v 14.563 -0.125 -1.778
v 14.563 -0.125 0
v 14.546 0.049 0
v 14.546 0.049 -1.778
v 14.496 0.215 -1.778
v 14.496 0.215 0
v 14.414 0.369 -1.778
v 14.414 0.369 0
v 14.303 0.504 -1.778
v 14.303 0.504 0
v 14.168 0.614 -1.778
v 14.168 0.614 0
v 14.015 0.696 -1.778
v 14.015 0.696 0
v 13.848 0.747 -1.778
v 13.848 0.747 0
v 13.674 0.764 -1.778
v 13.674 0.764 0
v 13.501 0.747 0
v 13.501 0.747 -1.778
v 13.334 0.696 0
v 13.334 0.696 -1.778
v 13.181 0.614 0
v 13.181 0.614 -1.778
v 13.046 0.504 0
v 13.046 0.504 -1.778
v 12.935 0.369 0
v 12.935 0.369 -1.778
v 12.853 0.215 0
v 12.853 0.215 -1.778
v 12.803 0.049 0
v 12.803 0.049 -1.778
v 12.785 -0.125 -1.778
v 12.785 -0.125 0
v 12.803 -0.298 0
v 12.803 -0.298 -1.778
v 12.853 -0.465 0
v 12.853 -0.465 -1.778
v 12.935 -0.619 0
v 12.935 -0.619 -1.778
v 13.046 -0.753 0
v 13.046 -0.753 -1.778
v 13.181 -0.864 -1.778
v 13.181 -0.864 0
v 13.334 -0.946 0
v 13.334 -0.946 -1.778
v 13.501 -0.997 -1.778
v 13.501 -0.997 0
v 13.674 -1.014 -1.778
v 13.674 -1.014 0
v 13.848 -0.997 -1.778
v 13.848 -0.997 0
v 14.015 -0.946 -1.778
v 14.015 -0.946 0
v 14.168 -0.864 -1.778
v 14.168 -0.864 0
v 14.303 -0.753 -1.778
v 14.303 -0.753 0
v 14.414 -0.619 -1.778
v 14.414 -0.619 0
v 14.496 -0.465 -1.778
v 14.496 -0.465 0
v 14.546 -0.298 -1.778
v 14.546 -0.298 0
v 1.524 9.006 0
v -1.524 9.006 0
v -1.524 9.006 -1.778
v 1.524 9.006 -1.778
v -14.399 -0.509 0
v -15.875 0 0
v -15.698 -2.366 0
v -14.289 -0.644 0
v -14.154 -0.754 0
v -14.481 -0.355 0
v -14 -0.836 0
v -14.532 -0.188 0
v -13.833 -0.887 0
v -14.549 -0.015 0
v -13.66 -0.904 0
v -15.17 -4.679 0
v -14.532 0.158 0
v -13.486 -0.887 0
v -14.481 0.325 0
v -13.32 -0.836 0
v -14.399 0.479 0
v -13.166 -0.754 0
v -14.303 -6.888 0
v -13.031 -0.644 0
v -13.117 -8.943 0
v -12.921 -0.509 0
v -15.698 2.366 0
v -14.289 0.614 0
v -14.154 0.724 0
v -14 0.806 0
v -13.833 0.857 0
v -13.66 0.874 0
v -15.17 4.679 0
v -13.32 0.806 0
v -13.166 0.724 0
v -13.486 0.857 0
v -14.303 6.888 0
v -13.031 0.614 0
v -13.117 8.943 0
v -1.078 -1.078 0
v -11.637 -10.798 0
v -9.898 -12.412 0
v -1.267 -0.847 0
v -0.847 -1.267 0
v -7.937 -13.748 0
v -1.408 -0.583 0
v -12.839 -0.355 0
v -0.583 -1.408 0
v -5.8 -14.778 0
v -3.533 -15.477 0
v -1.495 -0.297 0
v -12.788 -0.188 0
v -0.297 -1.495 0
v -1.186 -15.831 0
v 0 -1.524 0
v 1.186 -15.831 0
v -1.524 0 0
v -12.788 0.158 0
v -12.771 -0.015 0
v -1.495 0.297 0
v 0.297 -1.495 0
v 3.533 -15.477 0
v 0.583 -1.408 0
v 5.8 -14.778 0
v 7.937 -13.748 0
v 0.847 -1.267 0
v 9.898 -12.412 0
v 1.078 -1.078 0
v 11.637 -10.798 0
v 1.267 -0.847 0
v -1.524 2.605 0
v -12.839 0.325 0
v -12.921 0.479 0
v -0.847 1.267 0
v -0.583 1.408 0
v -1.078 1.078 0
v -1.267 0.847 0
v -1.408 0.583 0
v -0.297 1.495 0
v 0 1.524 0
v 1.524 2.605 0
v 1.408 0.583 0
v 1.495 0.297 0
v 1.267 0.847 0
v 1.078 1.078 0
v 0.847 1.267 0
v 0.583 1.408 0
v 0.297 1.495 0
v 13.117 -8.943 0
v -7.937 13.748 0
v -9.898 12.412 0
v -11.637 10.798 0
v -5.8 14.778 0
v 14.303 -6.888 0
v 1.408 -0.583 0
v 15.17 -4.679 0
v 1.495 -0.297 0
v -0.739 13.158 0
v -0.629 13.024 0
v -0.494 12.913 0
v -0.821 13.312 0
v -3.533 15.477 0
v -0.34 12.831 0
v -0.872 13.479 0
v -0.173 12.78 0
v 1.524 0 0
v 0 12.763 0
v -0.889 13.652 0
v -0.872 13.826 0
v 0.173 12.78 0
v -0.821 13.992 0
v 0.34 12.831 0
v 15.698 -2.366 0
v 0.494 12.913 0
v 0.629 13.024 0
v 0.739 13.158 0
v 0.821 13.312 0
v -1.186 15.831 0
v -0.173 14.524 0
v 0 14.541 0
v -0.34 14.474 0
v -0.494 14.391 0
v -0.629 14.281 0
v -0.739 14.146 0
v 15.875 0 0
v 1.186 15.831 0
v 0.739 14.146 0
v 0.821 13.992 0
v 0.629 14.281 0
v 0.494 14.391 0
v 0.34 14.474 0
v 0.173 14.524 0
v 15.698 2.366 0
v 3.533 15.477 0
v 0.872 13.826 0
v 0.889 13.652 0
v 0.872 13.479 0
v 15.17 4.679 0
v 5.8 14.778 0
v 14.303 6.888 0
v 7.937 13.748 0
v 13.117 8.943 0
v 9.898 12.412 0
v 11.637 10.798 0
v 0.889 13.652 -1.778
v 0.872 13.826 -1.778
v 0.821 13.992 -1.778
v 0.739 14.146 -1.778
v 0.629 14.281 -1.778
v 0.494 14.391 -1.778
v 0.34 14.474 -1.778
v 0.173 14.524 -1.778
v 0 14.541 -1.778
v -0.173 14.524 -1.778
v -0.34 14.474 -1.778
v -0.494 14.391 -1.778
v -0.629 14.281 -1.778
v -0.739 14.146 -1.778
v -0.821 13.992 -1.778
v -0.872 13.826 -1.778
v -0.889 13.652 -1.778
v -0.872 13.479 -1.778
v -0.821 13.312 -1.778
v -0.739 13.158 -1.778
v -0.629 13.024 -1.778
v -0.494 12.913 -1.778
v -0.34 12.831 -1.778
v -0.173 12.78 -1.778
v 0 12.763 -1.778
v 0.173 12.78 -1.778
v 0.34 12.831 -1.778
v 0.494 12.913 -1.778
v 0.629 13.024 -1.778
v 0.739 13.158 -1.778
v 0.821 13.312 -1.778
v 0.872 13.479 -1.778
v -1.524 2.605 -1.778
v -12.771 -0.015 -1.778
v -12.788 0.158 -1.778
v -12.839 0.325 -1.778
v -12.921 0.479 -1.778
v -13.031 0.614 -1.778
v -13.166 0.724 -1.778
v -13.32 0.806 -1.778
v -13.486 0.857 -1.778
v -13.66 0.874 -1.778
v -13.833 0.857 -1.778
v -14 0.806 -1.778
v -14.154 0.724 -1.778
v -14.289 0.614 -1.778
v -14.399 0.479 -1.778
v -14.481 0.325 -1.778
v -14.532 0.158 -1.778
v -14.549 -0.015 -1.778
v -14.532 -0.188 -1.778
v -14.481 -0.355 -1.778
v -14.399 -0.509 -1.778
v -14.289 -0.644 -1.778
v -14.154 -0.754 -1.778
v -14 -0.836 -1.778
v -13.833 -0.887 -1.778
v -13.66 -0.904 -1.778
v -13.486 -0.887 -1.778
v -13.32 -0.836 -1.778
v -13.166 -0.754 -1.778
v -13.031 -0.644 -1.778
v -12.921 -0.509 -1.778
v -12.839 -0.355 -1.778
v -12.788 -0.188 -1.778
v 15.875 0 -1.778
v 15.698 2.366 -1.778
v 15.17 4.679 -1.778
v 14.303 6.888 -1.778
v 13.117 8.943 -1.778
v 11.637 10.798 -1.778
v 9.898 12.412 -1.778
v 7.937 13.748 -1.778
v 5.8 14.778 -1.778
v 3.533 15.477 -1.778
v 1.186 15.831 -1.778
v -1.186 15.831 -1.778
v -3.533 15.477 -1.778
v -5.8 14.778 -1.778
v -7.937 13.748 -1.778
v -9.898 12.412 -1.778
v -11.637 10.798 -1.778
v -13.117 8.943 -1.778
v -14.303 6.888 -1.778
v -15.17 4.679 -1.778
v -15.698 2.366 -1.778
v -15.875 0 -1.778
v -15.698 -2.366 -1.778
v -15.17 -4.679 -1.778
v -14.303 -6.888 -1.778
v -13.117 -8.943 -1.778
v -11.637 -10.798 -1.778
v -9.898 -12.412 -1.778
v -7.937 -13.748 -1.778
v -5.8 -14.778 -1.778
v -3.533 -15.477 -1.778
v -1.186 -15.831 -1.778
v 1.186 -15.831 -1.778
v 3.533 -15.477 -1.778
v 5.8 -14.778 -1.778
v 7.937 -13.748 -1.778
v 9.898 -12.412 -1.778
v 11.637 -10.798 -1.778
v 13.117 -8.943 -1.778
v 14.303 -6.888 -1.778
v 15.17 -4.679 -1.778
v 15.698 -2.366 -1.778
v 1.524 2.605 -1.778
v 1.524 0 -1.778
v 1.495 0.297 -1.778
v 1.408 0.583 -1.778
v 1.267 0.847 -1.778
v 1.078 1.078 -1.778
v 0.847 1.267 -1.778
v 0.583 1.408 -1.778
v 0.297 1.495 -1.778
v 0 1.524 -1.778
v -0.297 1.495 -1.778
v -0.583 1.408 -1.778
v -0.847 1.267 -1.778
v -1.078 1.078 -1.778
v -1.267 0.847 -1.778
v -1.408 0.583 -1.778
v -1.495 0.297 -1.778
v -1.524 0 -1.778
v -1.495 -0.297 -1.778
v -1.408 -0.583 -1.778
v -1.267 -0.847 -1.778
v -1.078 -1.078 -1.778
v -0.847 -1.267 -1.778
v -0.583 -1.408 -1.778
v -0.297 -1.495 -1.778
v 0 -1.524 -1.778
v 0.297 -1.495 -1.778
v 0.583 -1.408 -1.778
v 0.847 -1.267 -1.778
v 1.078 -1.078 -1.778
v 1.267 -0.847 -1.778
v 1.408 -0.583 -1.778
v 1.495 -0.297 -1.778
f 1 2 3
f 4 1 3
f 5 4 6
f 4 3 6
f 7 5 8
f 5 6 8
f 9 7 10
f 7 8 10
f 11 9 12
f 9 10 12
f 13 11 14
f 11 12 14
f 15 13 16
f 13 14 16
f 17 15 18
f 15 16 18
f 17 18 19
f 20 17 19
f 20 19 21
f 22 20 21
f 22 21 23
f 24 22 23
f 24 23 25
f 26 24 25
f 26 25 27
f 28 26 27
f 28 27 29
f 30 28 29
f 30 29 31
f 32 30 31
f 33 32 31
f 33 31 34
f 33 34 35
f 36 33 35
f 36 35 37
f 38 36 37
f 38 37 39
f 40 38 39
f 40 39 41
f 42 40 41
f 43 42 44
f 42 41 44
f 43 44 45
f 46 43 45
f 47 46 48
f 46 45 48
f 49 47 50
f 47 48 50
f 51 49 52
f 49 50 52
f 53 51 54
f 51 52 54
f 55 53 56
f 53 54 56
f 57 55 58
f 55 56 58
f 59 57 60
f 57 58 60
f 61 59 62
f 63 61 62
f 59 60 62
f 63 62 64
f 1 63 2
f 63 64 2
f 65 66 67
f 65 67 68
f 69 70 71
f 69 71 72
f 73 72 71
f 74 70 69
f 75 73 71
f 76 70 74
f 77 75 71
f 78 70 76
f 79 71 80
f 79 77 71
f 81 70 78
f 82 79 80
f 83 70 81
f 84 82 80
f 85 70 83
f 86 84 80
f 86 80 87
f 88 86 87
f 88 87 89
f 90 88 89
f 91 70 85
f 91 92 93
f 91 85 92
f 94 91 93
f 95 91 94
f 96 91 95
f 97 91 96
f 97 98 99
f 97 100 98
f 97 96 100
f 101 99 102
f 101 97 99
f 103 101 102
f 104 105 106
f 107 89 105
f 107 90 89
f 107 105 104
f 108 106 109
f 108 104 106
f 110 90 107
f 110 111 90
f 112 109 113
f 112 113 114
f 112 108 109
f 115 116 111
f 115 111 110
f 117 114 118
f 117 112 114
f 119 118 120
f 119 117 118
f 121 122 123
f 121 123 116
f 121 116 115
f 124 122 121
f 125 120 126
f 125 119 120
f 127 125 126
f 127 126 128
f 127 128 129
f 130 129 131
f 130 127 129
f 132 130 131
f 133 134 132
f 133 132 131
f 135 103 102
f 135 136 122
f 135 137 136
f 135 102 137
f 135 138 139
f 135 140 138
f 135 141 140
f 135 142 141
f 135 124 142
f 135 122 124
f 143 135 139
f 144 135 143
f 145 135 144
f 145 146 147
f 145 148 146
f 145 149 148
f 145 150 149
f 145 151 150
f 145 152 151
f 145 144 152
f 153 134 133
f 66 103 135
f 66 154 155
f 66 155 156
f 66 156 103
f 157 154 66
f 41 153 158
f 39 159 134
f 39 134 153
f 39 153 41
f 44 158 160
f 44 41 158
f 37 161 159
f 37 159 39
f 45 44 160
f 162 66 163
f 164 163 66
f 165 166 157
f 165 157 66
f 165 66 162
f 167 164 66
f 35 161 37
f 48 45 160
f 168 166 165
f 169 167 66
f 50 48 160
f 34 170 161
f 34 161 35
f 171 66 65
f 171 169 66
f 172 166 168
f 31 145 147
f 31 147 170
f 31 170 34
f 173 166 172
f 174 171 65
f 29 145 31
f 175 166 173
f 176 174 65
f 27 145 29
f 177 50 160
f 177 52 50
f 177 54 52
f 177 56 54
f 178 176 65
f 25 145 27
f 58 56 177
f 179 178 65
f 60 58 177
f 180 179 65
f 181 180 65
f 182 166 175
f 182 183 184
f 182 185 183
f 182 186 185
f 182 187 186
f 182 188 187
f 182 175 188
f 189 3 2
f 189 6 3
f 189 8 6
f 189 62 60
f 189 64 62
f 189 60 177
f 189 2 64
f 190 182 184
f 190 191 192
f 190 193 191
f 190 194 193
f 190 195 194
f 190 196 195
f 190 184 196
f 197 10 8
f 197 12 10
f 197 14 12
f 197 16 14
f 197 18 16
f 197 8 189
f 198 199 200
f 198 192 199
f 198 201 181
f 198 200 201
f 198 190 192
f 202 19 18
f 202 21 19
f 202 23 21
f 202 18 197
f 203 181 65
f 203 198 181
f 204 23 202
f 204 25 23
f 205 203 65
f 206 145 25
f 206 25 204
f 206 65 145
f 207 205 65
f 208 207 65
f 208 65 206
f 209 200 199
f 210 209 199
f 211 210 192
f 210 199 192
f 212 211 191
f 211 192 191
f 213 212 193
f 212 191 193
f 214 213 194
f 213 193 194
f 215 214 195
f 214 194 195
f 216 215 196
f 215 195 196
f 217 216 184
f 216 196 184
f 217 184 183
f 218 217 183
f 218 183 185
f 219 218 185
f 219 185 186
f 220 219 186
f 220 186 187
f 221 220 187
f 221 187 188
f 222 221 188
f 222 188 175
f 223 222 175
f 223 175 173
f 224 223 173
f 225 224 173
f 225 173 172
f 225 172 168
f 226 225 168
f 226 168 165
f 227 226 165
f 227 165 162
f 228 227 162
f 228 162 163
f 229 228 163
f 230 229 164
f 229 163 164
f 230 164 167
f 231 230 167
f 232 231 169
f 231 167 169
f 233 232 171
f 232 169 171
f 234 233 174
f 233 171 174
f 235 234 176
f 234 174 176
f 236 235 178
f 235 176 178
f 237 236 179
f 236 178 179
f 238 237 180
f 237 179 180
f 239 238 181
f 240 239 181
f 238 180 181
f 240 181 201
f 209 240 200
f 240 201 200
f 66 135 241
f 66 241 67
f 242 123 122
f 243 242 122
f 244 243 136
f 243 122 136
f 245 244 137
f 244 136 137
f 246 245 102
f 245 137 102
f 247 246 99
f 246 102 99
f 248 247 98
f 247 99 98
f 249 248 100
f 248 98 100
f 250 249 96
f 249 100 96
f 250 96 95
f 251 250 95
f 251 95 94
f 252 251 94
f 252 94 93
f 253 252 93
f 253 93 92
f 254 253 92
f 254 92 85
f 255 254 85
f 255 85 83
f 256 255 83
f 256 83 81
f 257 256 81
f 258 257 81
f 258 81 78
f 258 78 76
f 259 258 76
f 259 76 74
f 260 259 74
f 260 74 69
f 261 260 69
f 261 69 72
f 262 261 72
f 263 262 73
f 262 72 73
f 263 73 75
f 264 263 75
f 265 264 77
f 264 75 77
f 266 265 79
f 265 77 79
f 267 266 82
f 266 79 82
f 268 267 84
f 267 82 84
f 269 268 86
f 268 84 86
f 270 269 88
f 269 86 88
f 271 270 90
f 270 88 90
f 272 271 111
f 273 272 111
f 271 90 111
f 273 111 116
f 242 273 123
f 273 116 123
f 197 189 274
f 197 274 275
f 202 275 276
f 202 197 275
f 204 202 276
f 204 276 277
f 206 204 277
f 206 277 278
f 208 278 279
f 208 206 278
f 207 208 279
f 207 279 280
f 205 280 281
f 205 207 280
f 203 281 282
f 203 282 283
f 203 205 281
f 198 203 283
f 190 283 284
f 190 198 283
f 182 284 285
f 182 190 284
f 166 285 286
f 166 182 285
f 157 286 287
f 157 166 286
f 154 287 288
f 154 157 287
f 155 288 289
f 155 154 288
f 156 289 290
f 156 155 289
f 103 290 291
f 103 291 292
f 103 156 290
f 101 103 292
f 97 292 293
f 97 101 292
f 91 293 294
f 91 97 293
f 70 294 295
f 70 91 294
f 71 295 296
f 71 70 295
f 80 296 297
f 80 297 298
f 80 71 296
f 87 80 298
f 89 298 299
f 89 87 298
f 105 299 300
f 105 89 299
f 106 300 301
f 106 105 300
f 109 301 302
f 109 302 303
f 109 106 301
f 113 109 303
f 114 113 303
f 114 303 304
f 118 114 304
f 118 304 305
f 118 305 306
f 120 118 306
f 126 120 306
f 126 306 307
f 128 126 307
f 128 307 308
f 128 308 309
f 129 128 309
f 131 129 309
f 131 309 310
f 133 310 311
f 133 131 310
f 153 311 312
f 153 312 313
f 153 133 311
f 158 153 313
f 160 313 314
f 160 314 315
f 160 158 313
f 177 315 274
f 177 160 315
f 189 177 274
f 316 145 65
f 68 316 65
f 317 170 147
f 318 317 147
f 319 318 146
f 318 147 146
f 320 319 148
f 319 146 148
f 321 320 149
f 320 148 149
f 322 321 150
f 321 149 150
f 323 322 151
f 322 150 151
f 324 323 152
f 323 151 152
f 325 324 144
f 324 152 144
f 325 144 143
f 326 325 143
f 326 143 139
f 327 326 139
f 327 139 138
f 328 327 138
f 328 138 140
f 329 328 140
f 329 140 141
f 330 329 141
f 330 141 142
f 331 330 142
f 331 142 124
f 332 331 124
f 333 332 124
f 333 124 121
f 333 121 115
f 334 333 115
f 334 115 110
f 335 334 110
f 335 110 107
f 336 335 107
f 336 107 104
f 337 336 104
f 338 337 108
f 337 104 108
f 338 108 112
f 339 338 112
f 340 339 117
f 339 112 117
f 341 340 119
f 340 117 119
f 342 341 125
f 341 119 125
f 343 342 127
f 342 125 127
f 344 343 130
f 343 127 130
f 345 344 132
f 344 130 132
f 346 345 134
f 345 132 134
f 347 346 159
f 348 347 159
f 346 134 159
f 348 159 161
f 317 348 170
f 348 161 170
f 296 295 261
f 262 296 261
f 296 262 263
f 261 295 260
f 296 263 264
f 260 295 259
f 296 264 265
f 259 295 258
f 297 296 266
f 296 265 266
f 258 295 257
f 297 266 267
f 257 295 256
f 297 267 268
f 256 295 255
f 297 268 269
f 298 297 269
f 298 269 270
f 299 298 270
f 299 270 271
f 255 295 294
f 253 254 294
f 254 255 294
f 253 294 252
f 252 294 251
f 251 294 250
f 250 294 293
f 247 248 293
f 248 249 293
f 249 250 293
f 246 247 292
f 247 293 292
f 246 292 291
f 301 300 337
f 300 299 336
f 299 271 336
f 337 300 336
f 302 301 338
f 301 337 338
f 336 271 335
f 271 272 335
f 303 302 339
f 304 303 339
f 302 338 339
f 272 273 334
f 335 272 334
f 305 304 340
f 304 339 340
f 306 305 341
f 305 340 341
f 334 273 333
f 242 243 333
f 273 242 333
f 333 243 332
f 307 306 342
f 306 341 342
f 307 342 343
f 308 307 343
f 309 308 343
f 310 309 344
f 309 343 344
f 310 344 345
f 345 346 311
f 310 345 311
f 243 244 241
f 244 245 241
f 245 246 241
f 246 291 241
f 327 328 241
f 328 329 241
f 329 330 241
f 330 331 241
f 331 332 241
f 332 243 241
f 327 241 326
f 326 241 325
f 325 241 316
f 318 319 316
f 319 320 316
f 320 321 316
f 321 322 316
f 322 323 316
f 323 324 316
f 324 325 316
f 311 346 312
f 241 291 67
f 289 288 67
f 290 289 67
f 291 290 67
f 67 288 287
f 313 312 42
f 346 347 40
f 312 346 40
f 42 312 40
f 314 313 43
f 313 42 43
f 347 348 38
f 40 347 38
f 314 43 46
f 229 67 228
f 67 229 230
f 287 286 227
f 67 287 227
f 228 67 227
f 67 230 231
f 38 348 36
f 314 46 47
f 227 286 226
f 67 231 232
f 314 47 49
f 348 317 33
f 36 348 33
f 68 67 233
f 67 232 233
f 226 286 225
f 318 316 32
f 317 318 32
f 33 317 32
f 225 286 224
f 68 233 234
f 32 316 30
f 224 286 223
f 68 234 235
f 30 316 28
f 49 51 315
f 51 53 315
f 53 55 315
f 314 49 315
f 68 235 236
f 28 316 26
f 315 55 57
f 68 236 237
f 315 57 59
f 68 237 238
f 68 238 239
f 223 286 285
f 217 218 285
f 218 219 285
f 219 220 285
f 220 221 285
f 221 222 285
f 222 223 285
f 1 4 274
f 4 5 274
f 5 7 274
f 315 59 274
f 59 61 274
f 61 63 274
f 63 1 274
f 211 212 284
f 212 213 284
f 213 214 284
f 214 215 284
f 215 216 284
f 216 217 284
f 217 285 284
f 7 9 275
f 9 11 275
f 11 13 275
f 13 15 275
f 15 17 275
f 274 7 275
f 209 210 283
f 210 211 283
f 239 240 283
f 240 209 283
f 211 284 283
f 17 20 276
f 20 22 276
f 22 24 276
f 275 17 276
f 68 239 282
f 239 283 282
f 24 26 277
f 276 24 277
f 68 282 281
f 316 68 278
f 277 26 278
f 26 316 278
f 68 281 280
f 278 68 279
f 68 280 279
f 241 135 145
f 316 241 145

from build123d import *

# Parameters (mm, degrees)
F0_R     = 15.875
F1_DEPTH = 1.778
F3_R     = 0.889
F4_DEPTH = 1.91313
F5_R     = 1.524
F5_W     = 3.048
F5_H     = 6.400035
F6_DEPTH = 2.22015


with BuildPart() as f1:
    # F0 (on Top) → F1 (new body)
    with BuildSketch(Plane.XY):
        Circle(F0_R)
    extrude(amount=-F1_DEPTH)

    # F3 (on face) → F4 (cut)
    with BuildSketch(Plane.XY):
        with Locations((0, 13.652203)):
            Circle(F3_R)
        with Locations((-13.659894, -0.015021)):
            Circle(F3_R)
        with Locations((13.674476, -0.124876)):
            Circle(F3_R)
    extrude(amount=-F4_DEPTH, mode=Mode.SUBTRACT)

    # F5 (on face) → F6 (cut)
    with BuildSketch(Plane.XY):
        Circle(F5_R)
        with Locations((0, 5.805492)):
            Rectangle(F5_W, F5_H)
    extrude(amount=-F6_DEPTH, mode=Mode.SUBTRACT)


solid = f1.part
